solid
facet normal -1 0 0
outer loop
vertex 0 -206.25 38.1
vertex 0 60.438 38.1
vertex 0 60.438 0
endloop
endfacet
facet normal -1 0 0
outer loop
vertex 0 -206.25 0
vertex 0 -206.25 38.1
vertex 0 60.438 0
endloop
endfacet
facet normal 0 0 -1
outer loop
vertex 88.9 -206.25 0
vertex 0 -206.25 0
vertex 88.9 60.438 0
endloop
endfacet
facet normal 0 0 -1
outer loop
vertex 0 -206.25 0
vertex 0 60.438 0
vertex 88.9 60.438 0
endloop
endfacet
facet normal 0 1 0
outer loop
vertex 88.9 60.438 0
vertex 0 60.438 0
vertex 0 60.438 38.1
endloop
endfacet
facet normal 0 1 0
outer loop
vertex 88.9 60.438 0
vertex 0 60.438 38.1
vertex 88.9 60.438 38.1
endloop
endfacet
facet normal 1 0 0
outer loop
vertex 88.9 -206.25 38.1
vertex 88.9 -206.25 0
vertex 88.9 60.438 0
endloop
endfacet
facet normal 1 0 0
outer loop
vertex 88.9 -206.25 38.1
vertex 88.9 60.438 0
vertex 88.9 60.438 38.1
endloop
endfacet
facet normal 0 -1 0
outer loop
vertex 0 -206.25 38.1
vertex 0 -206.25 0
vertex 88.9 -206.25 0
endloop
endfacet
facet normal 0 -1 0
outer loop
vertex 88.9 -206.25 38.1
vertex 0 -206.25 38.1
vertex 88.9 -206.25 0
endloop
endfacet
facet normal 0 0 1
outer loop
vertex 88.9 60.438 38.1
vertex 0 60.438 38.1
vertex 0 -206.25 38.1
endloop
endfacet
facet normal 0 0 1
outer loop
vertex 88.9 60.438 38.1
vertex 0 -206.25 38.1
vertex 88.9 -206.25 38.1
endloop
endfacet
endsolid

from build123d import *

# Parameters (mm, degrees)
F0_W     = 136.1323334277
F0_H     = 35.306327045
F1_DEPTH = 88.9
F2_DEPTH = 2.794
F3_DEPTH = 130.556


with BuildPart() as f1:
    # F0 (on Right) → F1 (new body)
    with BuildSketch(Plane.YZ):
        with Locations((-7.6281111687, 17.6531635225)):
            Rectangle(F0_W, F0_H)
    extrude(amount=F1_DEPTH)

    # F2 (add): a face of the model
    f2_faces = [f1.faces().sort_by_distance(p)[0] for p in [
        (44.45, -7.6281111687, 35.306327045),
    ]]
    extrude(f2_faces, amount=F2_DEPTH)

    # F3 (add): a face of the model
    f3_faces = [f1.faces().sort_by_distance(p)[0] for p in [
        (44.45, -75.6942778826, 19.0501635225),
    ]]
    extrude(f3_faces, amount=F3_DEPTH)


solid = f1.part
